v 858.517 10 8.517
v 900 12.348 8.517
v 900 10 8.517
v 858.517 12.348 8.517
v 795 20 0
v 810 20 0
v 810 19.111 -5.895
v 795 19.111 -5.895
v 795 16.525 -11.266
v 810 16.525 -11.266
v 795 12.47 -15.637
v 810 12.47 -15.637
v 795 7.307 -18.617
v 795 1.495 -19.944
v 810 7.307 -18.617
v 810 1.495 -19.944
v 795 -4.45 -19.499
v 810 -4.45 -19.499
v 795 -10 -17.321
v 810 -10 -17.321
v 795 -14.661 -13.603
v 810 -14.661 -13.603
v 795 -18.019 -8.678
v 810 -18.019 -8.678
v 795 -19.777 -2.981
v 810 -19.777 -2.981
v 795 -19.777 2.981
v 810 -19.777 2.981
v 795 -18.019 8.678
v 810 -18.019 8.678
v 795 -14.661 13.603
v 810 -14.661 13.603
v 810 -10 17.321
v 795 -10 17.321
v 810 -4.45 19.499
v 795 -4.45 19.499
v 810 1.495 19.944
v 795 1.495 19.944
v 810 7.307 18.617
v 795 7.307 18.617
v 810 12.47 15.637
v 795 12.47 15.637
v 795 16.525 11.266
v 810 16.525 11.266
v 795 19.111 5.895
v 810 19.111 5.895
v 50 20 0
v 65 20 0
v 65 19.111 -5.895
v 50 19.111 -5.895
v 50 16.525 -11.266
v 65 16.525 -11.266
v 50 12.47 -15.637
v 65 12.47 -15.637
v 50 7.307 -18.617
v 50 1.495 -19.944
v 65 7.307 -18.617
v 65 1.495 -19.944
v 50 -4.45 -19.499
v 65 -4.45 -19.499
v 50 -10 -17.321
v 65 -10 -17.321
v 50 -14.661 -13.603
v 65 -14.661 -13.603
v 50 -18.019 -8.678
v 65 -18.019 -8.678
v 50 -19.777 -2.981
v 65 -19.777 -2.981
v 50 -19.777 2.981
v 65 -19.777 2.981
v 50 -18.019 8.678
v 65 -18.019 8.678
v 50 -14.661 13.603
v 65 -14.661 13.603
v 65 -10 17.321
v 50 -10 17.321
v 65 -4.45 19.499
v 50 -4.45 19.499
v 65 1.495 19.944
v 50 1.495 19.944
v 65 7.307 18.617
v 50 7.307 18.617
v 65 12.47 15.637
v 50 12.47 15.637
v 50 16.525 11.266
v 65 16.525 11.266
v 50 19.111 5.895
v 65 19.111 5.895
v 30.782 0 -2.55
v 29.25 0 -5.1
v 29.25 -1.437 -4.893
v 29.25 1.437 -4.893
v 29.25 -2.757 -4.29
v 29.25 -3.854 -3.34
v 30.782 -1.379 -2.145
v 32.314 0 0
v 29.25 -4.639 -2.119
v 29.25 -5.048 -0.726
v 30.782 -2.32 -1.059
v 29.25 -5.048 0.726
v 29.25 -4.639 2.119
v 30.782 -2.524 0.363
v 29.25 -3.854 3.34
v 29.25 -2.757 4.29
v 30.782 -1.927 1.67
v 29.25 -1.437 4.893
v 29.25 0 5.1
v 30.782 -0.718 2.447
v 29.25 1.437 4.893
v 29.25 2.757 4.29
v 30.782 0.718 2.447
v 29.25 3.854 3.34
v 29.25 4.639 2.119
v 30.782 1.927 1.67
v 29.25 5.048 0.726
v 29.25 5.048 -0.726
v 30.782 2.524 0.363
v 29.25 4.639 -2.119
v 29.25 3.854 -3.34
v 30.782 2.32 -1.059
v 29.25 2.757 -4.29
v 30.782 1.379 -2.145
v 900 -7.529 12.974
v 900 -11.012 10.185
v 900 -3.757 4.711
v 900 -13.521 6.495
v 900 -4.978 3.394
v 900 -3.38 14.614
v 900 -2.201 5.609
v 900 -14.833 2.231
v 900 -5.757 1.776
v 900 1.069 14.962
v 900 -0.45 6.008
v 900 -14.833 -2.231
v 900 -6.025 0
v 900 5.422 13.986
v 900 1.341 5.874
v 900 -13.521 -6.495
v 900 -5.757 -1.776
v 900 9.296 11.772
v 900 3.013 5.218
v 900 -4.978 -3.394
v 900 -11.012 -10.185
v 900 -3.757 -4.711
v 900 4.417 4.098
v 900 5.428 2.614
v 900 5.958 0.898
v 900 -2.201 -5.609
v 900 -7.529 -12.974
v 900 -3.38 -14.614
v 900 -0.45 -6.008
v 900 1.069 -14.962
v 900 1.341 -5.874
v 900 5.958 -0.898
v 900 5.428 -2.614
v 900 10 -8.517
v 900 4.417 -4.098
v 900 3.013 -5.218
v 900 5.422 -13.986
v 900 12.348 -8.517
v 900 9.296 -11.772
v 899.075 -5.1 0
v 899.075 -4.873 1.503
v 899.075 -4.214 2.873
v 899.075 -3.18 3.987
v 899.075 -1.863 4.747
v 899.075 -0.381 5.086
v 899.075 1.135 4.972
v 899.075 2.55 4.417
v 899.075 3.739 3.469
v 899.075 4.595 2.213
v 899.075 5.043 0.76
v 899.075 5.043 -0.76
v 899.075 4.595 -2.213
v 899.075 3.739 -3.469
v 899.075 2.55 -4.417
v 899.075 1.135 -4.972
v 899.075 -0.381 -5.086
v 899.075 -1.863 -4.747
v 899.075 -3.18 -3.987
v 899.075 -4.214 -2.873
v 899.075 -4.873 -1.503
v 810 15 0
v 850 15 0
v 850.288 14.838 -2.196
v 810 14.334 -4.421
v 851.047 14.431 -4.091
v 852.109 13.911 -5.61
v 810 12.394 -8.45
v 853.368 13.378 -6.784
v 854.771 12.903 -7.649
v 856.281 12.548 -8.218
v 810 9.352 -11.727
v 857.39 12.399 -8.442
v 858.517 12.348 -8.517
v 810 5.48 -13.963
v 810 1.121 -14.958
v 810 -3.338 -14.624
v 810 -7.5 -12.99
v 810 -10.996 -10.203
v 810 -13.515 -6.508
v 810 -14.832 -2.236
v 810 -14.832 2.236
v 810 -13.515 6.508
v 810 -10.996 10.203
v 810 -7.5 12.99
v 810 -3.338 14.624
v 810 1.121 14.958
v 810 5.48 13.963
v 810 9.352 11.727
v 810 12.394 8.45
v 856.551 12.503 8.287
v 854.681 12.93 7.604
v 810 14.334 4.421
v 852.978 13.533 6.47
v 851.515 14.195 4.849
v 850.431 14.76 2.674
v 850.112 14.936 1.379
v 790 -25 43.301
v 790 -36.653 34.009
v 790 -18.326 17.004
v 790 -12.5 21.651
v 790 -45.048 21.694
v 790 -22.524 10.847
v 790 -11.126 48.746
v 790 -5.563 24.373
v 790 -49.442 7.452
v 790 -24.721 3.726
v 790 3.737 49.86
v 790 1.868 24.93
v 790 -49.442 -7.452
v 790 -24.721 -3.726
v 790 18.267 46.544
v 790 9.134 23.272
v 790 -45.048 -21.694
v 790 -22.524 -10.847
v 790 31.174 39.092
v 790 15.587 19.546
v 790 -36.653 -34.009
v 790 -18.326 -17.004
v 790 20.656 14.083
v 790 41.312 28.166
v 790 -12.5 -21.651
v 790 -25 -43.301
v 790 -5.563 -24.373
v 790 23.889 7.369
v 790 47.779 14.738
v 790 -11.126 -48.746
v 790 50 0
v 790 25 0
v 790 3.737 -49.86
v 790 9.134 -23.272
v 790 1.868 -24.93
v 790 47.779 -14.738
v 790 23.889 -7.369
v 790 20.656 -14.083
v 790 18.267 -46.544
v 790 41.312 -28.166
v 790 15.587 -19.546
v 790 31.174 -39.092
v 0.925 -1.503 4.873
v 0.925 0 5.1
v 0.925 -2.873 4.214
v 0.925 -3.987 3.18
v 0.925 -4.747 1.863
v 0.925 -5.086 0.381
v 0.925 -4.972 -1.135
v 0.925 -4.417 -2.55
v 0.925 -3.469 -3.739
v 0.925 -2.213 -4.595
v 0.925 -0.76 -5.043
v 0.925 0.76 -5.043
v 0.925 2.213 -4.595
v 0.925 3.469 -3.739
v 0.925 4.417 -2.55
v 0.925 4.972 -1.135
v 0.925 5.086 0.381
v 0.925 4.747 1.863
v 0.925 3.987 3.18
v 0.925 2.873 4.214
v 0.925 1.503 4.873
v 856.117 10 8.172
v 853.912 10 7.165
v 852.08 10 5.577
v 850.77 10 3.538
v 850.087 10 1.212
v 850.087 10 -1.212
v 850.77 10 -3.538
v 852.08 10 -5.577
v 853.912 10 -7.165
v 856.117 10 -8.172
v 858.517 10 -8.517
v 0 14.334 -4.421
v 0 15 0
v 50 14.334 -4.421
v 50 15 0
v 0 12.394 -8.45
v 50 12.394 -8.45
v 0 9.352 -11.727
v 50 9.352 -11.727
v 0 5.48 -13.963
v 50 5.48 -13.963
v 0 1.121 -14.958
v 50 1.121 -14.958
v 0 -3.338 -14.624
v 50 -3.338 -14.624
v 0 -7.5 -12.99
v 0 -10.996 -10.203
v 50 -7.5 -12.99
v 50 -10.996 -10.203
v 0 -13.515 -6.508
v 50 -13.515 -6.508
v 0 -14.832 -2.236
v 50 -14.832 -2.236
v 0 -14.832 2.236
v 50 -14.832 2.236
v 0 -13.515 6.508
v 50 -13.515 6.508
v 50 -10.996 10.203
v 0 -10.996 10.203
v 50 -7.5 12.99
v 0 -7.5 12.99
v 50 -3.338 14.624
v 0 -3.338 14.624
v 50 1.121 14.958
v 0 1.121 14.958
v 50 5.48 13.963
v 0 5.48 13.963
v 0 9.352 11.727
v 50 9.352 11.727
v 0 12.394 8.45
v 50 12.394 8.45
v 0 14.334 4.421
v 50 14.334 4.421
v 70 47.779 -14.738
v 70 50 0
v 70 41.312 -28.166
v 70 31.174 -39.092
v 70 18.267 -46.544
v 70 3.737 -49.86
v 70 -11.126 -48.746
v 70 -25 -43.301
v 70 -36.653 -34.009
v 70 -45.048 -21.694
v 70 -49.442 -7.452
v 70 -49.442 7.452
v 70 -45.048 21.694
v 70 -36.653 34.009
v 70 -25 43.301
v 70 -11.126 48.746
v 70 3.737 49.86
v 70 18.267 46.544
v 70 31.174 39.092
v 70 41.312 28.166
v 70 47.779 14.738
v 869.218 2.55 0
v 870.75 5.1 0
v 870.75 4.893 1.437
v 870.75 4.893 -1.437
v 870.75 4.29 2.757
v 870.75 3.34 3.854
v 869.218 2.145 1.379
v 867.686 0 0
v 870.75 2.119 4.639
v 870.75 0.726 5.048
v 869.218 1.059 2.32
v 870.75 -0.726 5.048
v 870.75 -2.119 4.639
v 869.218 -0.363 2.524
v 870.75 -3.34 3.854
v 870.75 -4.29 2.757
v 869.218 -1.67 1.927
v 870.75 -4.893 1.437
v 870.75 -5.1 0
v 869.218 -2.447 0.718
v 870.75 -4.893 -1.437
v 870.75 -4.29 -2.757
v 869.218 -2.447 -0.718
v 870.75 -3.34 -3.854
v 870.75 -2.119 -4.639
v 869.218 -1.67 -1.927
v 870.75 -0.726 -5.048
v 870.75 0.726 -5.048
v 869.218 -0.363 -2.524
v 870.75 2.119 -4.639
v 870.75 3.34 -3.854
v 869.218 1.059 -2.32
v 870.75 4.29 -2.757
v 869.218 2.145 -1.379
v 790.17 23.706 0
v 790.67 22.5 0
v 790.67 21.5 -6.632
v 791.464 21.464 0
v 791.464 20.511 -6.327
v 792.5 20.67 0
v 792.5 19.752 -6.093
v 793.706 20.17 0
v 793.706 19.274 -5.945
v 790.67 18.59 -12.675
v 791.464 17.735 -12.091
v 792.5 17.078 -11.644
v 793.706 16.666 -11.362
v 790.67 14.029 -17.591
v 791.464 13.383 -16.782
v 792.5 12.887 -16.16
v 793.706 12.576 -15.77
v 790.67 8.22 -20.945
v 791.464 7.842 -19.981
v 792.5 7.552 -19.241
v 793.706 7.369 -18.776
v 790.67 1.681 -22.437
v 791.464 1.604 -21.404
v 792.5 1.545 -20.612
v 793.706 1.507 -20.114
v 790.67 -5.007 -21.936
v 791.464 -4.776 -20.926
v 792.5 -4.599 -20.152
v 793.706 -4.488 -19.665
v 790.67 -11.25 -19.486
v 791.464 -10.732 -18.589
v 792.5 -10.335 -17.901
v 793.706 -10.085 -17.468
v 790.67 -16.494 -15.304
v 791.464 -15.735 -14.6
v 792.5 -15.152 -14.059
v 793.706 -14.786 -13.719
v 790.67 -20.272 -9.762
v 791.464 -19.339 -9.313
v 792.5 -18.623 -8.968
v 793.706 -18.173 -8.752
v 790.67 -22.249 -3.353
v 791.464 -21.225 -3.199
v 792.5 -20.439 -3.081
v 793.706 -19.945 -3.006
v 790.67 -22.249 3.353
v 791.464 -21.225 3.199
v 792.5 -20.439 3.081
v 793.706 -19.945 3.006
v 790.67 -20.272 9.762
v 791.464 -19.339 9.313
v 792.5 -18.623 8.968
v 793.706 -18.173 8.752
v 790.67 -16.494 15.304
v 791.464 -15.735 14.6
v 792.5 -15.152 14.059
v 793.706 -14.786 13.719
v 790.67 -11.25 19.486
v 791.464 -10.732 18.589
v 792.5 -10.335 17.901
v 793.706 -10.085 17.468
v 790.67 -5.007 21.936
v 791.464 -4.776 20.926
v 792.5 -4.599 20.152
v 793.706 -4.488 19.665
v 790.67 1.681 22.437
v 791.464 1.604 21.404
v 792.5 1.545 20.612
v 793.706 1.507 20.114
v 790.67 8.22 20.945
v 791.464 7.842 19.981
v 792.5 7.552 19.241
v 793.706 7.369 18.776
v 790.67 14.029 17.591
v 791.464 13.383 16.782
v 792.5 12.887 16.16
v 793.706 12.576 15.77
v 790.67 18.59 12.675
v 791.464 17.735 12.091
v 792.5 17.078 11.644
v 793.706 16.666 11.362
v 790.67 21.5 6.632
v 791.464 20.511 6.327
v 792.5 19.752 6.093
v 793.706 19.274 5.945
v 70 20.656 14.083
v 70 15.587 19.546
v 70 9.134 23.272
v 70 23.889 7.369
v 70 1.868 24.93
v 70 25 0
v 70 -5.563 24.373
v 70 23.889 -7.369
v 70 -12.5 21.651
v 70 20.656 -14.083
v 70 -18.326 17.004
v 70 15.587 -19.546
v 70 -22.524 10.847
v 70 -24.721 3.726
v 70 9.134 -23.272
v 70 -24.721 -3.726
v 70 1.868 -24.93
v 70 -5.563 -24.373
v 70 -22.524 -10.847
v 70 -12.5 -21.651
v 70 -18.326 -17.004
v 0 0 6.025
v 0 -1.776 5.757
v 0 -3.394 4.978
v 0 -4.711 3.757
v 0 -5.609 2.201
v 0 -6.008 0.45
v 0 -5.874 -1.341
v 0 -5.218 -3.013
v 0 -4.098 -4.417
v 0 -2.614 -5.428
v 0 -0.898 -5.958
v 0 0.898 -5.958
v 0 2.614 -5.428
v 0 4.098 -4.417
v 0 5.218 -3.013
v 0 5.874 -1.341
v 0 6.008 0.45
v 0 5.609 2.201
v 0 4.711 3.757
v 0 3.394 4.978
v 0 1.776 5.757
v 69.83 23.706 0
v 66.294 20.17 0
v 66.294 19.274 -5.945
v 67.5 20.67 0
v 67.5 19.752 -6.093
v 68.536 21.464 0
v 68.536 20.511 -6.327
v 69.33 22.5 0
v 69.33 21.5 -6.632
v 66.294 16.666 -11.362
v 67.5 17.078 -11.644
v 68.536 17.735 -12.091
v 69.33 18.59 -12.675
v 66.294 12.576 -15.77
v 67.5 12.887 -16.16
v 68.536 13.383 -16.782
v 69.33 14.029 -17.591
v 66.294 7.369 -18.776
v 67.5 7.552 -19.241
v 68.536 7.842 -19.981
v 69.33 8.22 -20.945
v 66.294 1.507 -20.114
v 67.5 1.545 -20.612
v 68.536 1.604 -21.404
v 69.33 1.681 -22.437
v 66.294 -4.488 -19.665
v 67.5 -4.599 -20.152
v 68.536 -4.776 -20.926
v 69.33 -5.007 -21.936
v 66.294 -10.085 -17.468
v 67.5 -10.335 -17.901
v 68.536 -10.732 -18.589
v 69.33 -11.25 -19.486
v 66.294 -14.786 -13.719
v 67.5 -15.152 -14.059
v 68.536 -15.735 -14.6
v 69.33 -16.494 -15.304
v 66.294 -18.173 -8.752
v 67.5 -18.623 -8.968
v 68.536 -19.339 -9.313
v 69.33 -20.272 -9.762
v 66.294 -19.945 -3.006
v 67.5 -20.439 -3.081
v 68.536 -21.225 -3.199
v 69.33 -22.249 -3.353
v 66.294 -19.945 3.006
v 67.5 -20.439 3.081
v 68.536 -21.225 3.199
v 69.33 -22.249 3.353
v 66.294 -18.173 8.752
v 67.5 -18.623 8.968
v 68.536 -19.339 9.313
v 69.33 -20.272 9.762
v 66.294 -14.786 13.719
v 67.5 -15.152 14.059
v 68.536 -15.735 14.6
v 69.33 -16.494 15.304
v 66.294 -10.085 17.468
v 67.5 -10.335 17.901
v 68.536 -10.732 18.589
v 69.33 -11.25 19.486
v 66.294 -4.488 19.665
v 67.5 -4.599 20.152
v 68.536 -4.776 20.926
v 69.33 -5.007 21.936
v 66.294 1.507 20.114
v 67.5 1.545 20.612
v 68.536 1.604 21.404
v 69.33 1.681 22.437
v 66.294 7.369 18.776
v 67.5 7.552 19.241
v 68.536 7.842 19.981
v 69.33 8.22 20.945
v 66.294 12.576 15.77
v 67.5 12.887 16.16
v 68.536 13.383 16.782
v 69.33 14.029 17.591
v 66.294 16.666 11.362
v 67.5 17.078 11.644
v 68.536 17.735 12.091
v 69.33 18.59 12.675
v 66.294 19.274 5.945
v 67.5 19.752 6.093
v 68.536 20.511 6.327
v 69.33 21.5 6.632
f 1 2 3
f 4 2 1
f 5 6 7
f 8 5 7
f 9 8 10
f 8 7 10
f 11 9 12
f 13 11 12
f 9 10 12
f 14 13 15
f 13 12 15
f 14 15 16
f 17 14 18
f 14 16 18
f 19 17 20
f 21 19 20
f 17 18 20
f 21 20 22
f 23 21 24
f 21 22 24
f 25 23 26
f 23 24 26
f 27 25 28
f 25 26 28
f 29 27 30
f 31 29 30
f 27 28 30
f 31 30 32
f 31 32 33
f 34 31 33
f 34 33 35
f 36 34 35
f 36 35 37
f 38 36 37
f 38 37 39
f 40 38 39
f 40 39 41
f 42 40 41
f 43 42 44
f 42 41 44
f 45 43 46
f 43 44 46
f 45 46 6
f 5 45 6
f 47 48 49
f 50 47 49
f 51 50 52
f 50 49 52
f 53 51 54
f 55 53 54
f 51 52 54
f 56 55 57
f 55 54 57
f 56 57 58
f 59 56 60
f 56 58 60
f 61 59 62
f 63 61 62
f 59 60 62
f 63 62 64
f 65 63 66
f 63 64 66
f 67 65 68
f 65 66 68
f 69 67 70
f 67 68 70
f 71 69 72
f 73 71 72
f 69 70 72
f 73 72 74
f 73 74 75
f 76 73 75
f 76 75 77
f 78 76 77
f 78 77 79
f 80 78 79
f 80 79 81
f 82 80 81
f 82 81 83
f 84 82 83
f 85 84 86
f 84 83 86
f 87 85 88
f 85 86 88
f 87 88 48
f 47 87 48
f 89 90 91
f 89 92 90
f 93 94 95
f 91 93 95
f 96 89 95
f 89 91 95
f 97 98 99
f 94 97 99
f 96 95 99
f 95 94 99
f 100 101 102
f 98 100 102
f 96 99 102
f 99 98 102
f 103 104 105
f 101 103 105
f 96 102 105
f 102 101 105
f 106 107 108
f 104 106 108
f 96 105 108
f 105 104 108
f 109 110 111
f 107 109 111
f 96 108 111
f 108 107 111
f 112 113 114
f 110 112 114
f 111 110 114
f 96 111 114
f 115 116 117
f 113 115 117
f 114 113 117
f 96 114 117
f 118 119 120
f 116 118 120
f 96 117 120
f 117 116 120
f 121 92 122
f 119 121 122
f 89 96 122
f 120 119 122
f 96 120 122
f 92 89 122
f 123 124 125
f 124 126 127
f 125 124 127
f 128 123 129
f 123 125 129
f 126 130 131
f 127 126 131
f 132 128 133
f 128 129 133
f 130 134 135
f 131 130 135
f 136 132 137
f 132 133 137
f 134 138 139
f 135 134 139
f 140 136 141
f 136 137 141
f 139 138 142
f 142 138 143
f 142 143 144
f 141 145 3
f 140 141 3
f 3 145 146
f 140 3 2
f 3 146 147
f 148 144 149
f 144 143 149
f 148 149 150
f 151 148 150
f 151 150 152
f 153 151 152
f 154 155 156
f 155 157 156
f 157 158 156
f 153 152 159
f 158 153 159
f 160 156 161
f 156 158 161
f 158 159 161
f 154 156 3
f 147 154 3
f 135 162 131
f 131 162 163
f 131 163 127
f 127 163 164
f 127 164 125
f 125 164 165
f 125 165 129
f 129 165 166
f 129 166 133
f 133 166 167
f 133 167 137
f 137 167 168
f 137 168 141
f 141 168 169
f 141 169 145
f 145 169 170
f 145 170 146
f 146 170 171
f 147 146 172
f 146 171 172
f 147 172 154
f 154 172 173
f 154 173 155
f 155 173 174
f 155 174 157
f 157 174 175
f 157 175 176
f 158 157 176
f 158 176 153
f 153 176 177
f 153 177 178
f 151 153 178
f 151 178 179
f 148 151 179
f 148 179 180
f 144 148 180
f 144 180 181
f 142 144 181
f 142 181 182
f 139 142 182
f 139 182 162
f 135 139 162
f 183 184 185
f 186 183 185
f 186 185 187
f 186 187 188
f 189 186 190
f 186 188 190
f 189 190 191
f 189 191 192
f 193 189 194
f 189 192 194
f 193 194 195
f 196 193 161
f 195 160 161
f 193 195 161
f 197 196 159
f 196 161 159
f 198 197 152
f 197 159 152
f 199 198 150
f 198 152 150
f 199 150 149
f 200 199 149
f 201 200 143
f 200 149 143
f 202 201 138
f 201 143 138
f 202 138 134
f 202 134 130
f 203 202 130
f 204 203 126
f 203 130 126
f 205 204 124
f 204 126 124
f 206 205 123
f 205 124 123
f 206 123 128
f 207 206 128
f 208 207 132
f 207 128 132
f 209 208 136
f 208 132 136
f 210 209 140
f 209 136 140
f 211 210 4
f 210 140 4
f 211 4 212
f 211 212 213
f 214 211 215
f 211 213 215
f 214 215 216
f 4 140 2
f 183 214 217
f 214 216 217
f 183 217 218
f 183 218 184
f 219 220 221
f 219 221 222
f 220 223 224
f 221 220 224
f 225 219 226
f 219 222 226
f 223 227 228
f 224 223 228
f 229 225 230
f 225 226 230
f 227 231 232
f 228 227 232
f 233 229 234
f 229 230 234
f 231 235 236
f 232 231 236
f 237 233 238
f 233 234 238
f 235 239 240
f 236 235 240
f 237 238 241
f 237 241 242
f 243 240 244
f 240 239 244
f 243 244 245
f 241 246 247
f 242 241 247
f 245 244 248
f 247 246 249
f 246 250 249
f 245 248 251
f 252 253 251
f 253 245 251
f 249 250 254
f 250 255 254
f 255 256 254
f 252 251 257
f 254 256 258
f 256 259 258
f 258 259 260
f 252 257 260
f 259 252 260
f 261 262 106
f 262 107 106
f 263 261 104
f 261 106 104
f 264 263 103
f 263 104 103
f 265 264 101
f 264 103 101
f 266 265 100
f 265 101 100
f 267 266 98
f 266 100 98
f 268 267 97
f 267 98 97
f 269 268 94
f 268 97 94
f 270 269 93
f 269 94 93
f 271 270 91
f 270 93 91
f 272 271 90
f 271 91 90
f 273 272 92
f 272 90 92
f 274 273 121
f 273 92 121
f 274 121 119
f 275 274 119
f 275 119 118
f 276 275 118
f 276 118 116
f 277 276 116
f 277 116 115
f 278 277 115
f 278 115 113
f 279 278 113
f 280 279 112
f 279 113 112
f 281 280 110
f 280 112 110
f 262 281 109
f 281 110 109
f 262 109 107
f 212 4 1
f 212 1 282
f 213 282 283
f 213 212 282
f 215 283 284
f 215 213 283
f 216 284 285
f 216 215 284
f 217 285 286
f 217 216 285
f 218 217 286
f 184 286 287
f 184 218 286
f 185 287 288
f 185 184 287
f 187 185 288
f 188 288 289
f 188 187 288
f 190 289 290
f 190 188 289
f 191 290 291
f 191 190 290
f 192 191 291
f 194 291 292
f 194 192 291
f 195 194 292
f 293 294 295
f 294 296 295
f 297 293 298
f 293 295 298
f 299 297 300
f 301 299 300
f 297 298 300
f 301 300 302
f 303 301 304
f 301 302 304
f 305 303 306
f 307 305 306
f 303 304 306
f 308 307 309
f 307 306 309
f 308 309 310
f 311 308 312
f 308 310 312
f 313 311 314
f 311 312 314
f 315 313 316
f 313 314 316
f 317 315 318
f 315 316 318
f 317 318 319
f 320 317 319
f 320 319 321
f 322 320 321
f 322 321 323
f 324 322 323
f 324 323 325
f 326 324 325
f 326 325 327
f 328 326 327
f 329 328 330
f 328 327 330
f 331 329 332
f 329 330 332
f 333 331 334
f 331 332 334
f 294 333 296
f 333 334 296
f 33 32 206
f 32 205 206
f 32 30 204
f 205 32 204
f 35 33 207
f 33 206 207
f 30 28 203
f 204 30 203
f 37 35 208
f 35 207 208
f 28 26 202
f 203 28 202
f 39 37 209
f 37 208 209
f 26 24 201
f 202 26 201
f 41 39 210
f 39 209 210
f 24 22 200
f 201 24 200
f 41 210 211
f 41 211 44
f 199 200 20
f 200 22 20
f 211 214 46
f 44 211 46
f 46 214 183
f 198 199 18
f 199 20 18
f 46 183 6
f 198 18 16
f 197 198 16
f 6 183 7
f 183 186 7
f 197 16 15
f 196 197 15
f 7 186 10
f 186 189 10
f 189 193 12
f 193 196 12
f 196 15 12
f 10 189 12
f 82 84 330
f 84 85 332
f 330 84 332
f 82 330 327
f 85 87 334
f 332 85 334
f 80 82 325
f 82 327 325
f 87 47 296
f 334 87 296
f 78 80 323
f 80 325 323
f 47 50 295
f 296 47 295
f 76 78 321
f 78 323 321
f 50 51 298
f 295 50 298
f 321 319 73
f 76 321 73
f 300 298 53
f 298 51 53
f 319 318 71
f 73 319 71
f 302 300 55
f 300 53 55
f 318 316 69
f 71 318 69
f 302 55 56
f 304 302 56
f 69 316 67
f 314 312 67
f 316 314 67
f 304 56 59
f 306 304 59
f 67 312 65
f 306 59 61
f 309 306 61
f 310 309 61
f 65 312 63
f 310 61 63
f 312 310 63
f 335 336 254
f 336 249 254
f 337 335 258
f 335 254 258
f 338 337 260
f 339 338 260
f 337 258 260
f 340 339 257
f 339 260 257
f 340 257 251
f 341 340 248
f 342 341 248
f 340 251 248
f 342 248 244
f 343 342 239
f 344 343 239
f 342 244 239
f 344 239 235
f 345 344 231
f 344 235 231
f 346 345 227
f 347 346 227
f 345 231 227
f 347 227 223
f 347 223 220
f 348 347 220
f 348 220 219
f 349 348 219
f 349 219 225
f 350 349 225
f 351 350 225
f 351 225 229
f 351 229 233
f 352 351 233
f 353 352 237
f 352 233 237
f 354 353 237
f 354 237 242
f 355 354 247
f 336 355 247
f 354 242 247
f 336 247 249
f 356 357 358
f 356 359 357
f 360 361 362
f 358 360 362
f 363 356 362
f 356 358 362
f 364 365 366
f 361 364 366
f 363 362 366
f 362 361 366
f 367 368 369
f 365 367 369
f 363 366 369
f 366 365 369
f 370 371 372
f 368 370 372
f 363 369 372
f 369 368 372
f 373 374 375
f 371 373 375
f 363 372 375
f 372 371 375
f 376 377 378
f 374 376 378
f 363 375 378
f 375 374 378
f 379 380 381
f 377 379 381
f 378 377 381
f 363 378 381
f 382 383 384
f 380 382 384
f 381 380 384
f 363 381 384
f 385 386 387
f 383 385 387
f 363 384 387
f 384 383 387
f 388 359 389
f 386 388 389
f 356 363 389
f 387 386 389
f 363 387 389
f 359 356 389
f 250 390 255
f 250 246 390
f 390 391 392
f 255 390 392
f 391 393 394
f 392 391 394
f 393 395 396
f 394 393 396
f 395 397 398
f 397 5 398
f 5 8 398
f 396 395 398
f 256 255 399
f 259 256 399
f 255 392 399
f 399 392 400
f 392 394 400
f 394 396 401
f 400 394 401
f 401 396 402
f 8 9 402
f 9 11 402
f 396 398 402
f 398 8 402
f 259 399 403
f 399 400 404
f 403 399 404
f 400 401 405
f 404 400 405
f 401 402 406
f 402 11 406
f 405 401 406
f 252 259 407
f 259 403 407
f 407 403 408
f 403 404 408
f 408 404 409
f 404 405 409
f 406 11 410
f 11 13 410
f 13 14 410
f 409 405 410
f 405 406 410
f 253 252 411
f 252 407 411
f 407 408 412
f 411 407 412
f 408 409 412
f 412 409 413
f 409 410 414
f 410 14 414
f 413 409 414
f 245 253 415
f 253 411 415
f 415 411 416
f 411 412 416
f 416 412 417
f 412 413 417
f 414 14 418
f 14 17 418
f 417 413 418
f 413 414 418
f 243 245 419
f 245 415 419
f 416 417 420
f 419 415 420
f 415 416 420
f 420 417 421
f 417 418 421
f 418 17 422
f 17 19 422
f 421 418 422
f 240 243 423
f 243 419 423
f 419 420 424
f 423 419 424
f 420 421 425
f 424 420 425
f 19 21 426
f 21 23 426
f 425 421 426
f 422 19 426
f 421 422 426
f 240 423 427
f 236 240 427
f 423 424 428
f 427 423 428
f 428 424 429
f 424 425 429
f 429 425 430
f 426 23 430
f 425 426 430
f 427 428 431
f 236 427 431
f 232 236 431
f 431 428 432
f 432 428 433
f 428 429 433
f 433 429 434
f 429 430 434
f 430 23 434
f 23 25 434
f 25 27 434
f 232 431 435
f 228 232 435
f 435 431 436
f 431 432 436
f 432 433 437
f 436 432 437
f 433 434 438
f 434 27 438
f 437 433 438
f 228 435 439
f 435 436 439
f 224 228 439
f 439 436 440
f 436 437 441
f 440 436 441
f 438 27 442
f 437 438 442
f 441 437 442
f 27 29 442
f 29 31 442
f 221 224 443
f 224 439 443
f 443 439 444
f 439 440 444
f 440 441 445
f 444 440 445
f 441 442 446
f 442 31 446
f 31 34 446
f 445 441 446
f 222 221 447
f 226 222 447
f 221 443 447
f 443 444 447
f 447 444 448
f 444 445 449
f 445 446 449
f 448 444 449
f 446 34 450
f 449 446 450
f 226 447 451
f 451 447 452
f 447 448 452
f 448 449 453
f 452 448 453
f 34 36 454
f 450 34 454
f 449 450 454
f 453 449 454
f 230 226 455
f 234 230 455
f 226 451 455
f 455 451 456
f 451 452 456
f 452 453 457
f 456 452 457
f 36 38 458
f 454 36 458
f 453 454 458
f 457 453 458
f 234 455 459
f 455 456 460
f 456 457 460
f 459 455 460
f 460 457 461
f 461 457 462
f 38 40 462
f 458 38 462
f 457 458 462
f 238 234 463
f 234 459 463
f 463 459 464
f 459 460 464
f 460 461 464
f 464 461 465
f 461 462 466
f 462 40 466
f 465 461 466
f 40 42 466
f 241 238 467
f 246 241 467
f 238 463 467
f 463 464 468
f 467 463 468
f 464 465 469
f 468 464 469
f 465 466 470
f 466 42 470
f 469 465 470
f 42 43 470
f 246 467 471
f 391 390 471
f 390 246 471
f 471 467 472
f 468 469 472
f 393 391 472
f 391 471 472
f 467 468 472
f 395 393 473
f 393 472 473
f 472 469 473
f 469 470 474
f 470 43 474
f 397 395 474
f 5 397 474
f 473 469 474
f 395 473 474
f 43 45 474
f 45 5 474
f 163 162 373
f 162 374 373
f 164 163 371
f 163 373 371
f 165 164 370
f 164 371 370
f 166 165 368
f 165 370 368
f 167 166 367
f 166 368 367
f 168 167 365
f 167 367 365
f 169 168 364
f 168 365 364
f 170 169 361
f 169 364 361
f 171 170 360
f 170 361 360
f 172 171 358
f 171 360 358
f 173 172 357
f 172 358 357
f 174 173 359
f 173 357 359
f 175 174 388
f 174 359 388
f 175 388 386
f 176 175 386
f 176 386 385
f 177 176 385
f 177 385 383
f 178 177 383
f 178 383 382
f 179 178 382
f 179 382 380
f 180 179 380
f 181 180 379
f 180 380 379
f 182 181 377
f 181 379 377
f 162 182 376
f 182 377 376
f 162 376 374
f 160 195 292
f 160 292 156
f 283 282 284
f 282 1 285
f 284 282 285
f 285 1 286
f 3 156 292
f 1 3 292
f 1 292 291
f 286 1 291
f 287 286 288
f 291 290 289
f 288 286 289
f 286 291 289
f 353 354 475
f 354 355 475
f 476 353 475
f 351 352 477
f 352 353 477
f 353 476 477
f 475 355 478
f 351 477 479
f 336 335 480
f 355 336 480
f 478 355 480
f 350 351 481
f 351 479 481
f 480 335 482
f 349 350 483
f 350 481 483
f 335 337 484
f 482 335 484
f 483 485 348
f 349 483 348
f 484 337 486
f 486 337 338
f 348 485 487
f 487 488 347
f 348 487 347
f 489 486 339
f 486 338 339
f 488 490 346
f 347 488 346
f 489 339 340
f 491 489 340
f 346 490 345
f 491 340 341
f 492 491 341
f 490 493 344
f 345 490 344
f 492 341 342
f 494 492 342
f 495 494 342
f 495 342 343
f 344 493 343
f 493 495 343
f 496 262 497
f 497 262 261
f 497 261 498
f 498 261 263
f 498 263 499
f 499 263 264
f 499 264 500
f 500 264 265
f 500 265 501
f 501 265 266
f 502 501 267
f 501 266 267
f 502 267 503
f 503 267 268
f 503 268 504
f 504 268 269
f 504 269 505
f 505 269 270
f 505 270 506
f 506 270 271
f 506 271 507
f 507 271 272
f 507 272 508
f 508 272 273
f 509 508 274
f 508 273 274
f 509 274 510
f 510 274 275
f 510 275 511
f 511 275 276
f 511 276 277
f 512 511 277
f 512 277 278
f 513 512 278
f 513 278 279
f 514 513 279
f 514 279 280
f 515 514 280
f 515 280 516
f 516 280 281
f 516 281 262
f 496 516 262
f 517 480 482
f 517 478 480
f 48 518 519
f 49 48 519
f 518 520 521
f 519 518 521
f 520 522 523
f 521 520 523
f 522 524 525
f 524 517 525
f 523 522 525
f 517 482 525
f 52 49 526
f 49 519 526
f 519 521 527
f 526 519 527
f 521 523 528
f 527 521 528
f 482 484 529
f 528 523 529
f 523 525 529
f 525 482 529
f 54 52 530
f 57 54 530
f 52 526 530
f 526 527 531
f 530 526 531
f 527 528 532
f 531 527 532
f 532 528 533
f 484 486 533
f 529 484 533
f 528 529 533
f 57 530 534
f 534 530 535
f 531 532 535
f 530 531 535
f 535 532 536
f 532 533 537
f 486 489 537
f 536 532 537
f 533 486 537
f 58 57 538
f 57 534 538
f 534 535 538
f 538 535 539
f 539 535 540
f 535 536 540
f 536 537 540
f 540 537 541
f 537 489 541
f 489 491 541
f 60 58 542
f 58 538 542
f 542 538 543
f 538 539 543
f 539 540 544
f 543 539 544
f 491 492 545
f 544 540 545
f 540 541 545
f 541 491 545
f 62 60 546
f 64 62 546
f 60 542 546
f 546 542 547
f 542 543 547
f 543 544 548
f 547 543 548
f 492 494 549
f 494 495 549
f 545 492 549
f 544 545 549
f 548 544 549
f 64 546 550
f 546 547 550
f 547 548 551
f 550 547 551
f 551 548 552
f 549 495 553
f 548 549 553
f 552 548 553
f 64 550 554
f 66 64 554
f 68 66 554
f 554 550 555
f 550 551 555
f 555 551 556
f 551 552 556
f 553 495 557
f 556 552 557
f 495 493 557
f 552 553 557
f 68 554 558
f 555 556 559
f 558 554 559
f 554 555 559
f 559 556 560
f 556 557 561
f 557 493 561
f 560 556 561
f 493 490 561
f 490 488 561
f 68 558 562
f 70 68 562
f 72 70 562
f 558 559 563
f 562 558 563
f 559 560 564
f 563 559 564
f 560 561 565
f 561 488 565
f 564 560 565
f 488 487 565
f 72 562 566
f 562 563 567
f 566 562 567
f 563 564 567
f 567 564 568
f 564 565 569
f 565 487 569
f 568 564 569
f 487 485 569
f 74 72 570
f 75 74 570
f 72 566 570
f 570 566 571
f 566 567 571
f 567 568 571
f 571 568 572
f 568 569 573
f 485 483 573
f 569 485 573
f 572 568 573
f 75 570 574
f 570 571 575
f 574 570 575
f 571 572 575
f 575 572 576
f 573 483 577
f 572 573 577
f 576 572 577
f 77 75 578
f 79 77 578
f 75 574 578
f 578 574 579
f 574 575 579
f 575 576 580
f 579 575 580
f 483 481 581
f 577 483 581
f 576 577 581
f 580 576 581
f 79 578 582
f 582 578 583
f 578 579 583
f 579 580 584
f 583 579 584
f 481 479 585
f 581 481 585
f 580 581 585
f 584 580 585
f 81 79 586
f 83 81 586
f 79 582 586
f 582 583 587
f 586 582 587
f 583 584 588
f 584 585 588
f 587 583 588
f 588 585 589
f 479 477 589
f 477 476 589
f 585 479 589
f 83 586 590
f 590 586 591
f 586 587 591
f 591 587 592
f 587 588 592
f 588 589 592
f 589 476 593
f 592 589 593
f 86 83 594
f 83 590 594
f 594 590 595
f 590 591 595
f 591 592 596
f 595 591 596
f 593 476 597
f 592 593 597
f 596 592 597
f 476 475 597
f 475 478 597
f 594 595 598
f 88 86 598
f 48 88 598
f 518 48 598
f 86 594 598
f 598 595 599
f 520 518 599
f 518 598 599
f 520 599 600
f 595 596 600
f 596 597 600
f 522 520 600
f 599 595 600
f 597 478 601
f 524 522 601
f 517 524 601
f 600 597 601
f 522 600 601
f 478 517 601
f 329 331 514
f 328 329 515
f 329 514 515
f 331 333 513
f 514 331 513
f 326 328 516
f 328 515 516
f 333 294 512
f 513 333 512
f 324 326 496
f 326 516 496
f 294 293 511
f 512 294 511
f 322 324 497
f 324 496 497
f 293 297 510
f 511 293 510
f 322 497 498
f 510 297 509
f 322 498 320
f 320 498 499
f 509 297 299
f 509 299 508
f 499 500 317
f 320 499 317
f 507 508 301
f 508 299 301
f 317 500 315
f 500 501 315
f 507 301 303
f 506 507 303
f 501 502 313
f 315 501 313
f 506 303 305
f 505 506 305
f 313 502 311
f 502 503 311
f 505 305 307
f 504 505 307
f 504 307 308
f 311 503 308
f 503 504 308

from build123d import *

# Parameters (mm, degrees)
FILLET1_R                              = 5
M12_TAPPED_HOLE1_D                     = 10.2
M12_TAPPED_HOLE1_DEPTH                 = 29.25
M12_TAPPED_HOLE1_CSINK_D               = 12.05
M12_TAPPED_HOLE1_CSINK_ANGLE           = 90
M12_TAPPED_HOLE1_TIP                   = 3.064389157
M12_TAPPED_HOLE1_ON_FACE_2_D           = 10.2
M12_TAPPED_HOLE1_ON_FACE_2_DEPTH       = 29.25
M12_TAPPED_HOLE1_ON_FACE_2_CSINK_D     = 12.05
M12_TAPPED_HOLE1_ON_FACE_2_CSINK_ANGLE = 90
M12_TAPPED_HOLE1_ON_FACE_2_TIP         = 3.064389157
CUT_EXTRUDE1_DEPTH                     = 5


with BuildPart() as part:
    # Sketch1 → Revolve1 (revolve)
    with BuildSketch(Plane.XY):
        Polygon((0, 0), (0, 15), (50, 15), (50, 20), (70, 20), (70, 50), (790, 50), (790, 20), (810, 20), (810, 15), (900, 15), (900, 0), align=None)
    revolve(axis=Axis((900, 0, 0), (-1, 0, 0)))

    # Fillet1
    fillet1_edges = [part.edges().sort_by_distance(p)[0] for p in [
        (790, -20, 0),
        (70, -20, 0),
    ]]
    fillet(fillet1_edges, radius=FILLET1_R)

    # M12 Tapped Hole1
    with Locations(Plane.YZ.offset(900)):
        with Locations((0, 0)):
            CounterSinkHole(M12_TAPPED_HOLE1_D / 2, M12_TAPPED_HOLE1_CSINK_D / 2, depth=M12_TAPPED_HOLE1_DEPTH, counter_sink_angle=M12_TAPPED_HOLE1_CSINK_ANGLE)
            with Locations((0, 0, -(M12_TAPPED_HOLE1_DEPTH + M12_TAPPED_HOLE1_TIP / 2))):  # 118° drill point
                Cone(0, M12_TAPPED_HOLE1_D / 2, M12_TAPPED_HOLE1_TIP, mode=Mode.SUBTRACT)

    # M12 Tapped Hole1 on face 2
    with Locations(Plane(origin=(0, 0, 0), x_dir=(0, 0, -1), z_dir=(-1, 0, 0))):
        with Locations((0, 0)):
            CounterSinkHole(M12_TAPPED_HOLE1_ON_FACE_2_D / 2, M12_TAPPED_HOLE1_ON_FACE_2_CSINK_D / 2, depth=M12_TAPPED_HOLE1_ON_FACE_2_DEPTH, counter_sink_angle=M12_TAPPED_HOLE1_ON_FACE_2_CSINK_ANGLE)
            with Locations((0, 0, -(M12_TAPPED_HOLE1_ON_FACE_2_DEPTH + M12_TAPPED_HOLE1_ON_FACE_2_TIP / 2))):  # 118° drill point
                Cone(0, M12_TAPPED_HOLE1_ON_FACE_2_D / 2, M12_TAPPED_HOLE1_ON_FACE_2_TIP, mode=Mode.SUBTRACT)

    # Sketch3 → Cut-Extrude1 (cut)
    with BuildSketch(Plane(origin=(0, 15, 0), x_dir=(1, 0, 0), z_dir=(0, 1, 0))):
        with BuildLine():
            Line((858.516691337, 8.516691337), (900, 8.516691337))
            ThreePointArc((900, 8.516691337), (908.516691337, 0), (900, -8.516691337))
            Line((900, -8.516691337), (858.516691337, -8.516691337))
            ThreePointArc((858.516691337, -8.516691337), (850, 0), (858.516691337, 8.516691337))
        make_face()
    extrude(amount=-CUT_EXTRUDE1_DEPTH, mode=Mode.SUBTRACT)


solid = part.part
